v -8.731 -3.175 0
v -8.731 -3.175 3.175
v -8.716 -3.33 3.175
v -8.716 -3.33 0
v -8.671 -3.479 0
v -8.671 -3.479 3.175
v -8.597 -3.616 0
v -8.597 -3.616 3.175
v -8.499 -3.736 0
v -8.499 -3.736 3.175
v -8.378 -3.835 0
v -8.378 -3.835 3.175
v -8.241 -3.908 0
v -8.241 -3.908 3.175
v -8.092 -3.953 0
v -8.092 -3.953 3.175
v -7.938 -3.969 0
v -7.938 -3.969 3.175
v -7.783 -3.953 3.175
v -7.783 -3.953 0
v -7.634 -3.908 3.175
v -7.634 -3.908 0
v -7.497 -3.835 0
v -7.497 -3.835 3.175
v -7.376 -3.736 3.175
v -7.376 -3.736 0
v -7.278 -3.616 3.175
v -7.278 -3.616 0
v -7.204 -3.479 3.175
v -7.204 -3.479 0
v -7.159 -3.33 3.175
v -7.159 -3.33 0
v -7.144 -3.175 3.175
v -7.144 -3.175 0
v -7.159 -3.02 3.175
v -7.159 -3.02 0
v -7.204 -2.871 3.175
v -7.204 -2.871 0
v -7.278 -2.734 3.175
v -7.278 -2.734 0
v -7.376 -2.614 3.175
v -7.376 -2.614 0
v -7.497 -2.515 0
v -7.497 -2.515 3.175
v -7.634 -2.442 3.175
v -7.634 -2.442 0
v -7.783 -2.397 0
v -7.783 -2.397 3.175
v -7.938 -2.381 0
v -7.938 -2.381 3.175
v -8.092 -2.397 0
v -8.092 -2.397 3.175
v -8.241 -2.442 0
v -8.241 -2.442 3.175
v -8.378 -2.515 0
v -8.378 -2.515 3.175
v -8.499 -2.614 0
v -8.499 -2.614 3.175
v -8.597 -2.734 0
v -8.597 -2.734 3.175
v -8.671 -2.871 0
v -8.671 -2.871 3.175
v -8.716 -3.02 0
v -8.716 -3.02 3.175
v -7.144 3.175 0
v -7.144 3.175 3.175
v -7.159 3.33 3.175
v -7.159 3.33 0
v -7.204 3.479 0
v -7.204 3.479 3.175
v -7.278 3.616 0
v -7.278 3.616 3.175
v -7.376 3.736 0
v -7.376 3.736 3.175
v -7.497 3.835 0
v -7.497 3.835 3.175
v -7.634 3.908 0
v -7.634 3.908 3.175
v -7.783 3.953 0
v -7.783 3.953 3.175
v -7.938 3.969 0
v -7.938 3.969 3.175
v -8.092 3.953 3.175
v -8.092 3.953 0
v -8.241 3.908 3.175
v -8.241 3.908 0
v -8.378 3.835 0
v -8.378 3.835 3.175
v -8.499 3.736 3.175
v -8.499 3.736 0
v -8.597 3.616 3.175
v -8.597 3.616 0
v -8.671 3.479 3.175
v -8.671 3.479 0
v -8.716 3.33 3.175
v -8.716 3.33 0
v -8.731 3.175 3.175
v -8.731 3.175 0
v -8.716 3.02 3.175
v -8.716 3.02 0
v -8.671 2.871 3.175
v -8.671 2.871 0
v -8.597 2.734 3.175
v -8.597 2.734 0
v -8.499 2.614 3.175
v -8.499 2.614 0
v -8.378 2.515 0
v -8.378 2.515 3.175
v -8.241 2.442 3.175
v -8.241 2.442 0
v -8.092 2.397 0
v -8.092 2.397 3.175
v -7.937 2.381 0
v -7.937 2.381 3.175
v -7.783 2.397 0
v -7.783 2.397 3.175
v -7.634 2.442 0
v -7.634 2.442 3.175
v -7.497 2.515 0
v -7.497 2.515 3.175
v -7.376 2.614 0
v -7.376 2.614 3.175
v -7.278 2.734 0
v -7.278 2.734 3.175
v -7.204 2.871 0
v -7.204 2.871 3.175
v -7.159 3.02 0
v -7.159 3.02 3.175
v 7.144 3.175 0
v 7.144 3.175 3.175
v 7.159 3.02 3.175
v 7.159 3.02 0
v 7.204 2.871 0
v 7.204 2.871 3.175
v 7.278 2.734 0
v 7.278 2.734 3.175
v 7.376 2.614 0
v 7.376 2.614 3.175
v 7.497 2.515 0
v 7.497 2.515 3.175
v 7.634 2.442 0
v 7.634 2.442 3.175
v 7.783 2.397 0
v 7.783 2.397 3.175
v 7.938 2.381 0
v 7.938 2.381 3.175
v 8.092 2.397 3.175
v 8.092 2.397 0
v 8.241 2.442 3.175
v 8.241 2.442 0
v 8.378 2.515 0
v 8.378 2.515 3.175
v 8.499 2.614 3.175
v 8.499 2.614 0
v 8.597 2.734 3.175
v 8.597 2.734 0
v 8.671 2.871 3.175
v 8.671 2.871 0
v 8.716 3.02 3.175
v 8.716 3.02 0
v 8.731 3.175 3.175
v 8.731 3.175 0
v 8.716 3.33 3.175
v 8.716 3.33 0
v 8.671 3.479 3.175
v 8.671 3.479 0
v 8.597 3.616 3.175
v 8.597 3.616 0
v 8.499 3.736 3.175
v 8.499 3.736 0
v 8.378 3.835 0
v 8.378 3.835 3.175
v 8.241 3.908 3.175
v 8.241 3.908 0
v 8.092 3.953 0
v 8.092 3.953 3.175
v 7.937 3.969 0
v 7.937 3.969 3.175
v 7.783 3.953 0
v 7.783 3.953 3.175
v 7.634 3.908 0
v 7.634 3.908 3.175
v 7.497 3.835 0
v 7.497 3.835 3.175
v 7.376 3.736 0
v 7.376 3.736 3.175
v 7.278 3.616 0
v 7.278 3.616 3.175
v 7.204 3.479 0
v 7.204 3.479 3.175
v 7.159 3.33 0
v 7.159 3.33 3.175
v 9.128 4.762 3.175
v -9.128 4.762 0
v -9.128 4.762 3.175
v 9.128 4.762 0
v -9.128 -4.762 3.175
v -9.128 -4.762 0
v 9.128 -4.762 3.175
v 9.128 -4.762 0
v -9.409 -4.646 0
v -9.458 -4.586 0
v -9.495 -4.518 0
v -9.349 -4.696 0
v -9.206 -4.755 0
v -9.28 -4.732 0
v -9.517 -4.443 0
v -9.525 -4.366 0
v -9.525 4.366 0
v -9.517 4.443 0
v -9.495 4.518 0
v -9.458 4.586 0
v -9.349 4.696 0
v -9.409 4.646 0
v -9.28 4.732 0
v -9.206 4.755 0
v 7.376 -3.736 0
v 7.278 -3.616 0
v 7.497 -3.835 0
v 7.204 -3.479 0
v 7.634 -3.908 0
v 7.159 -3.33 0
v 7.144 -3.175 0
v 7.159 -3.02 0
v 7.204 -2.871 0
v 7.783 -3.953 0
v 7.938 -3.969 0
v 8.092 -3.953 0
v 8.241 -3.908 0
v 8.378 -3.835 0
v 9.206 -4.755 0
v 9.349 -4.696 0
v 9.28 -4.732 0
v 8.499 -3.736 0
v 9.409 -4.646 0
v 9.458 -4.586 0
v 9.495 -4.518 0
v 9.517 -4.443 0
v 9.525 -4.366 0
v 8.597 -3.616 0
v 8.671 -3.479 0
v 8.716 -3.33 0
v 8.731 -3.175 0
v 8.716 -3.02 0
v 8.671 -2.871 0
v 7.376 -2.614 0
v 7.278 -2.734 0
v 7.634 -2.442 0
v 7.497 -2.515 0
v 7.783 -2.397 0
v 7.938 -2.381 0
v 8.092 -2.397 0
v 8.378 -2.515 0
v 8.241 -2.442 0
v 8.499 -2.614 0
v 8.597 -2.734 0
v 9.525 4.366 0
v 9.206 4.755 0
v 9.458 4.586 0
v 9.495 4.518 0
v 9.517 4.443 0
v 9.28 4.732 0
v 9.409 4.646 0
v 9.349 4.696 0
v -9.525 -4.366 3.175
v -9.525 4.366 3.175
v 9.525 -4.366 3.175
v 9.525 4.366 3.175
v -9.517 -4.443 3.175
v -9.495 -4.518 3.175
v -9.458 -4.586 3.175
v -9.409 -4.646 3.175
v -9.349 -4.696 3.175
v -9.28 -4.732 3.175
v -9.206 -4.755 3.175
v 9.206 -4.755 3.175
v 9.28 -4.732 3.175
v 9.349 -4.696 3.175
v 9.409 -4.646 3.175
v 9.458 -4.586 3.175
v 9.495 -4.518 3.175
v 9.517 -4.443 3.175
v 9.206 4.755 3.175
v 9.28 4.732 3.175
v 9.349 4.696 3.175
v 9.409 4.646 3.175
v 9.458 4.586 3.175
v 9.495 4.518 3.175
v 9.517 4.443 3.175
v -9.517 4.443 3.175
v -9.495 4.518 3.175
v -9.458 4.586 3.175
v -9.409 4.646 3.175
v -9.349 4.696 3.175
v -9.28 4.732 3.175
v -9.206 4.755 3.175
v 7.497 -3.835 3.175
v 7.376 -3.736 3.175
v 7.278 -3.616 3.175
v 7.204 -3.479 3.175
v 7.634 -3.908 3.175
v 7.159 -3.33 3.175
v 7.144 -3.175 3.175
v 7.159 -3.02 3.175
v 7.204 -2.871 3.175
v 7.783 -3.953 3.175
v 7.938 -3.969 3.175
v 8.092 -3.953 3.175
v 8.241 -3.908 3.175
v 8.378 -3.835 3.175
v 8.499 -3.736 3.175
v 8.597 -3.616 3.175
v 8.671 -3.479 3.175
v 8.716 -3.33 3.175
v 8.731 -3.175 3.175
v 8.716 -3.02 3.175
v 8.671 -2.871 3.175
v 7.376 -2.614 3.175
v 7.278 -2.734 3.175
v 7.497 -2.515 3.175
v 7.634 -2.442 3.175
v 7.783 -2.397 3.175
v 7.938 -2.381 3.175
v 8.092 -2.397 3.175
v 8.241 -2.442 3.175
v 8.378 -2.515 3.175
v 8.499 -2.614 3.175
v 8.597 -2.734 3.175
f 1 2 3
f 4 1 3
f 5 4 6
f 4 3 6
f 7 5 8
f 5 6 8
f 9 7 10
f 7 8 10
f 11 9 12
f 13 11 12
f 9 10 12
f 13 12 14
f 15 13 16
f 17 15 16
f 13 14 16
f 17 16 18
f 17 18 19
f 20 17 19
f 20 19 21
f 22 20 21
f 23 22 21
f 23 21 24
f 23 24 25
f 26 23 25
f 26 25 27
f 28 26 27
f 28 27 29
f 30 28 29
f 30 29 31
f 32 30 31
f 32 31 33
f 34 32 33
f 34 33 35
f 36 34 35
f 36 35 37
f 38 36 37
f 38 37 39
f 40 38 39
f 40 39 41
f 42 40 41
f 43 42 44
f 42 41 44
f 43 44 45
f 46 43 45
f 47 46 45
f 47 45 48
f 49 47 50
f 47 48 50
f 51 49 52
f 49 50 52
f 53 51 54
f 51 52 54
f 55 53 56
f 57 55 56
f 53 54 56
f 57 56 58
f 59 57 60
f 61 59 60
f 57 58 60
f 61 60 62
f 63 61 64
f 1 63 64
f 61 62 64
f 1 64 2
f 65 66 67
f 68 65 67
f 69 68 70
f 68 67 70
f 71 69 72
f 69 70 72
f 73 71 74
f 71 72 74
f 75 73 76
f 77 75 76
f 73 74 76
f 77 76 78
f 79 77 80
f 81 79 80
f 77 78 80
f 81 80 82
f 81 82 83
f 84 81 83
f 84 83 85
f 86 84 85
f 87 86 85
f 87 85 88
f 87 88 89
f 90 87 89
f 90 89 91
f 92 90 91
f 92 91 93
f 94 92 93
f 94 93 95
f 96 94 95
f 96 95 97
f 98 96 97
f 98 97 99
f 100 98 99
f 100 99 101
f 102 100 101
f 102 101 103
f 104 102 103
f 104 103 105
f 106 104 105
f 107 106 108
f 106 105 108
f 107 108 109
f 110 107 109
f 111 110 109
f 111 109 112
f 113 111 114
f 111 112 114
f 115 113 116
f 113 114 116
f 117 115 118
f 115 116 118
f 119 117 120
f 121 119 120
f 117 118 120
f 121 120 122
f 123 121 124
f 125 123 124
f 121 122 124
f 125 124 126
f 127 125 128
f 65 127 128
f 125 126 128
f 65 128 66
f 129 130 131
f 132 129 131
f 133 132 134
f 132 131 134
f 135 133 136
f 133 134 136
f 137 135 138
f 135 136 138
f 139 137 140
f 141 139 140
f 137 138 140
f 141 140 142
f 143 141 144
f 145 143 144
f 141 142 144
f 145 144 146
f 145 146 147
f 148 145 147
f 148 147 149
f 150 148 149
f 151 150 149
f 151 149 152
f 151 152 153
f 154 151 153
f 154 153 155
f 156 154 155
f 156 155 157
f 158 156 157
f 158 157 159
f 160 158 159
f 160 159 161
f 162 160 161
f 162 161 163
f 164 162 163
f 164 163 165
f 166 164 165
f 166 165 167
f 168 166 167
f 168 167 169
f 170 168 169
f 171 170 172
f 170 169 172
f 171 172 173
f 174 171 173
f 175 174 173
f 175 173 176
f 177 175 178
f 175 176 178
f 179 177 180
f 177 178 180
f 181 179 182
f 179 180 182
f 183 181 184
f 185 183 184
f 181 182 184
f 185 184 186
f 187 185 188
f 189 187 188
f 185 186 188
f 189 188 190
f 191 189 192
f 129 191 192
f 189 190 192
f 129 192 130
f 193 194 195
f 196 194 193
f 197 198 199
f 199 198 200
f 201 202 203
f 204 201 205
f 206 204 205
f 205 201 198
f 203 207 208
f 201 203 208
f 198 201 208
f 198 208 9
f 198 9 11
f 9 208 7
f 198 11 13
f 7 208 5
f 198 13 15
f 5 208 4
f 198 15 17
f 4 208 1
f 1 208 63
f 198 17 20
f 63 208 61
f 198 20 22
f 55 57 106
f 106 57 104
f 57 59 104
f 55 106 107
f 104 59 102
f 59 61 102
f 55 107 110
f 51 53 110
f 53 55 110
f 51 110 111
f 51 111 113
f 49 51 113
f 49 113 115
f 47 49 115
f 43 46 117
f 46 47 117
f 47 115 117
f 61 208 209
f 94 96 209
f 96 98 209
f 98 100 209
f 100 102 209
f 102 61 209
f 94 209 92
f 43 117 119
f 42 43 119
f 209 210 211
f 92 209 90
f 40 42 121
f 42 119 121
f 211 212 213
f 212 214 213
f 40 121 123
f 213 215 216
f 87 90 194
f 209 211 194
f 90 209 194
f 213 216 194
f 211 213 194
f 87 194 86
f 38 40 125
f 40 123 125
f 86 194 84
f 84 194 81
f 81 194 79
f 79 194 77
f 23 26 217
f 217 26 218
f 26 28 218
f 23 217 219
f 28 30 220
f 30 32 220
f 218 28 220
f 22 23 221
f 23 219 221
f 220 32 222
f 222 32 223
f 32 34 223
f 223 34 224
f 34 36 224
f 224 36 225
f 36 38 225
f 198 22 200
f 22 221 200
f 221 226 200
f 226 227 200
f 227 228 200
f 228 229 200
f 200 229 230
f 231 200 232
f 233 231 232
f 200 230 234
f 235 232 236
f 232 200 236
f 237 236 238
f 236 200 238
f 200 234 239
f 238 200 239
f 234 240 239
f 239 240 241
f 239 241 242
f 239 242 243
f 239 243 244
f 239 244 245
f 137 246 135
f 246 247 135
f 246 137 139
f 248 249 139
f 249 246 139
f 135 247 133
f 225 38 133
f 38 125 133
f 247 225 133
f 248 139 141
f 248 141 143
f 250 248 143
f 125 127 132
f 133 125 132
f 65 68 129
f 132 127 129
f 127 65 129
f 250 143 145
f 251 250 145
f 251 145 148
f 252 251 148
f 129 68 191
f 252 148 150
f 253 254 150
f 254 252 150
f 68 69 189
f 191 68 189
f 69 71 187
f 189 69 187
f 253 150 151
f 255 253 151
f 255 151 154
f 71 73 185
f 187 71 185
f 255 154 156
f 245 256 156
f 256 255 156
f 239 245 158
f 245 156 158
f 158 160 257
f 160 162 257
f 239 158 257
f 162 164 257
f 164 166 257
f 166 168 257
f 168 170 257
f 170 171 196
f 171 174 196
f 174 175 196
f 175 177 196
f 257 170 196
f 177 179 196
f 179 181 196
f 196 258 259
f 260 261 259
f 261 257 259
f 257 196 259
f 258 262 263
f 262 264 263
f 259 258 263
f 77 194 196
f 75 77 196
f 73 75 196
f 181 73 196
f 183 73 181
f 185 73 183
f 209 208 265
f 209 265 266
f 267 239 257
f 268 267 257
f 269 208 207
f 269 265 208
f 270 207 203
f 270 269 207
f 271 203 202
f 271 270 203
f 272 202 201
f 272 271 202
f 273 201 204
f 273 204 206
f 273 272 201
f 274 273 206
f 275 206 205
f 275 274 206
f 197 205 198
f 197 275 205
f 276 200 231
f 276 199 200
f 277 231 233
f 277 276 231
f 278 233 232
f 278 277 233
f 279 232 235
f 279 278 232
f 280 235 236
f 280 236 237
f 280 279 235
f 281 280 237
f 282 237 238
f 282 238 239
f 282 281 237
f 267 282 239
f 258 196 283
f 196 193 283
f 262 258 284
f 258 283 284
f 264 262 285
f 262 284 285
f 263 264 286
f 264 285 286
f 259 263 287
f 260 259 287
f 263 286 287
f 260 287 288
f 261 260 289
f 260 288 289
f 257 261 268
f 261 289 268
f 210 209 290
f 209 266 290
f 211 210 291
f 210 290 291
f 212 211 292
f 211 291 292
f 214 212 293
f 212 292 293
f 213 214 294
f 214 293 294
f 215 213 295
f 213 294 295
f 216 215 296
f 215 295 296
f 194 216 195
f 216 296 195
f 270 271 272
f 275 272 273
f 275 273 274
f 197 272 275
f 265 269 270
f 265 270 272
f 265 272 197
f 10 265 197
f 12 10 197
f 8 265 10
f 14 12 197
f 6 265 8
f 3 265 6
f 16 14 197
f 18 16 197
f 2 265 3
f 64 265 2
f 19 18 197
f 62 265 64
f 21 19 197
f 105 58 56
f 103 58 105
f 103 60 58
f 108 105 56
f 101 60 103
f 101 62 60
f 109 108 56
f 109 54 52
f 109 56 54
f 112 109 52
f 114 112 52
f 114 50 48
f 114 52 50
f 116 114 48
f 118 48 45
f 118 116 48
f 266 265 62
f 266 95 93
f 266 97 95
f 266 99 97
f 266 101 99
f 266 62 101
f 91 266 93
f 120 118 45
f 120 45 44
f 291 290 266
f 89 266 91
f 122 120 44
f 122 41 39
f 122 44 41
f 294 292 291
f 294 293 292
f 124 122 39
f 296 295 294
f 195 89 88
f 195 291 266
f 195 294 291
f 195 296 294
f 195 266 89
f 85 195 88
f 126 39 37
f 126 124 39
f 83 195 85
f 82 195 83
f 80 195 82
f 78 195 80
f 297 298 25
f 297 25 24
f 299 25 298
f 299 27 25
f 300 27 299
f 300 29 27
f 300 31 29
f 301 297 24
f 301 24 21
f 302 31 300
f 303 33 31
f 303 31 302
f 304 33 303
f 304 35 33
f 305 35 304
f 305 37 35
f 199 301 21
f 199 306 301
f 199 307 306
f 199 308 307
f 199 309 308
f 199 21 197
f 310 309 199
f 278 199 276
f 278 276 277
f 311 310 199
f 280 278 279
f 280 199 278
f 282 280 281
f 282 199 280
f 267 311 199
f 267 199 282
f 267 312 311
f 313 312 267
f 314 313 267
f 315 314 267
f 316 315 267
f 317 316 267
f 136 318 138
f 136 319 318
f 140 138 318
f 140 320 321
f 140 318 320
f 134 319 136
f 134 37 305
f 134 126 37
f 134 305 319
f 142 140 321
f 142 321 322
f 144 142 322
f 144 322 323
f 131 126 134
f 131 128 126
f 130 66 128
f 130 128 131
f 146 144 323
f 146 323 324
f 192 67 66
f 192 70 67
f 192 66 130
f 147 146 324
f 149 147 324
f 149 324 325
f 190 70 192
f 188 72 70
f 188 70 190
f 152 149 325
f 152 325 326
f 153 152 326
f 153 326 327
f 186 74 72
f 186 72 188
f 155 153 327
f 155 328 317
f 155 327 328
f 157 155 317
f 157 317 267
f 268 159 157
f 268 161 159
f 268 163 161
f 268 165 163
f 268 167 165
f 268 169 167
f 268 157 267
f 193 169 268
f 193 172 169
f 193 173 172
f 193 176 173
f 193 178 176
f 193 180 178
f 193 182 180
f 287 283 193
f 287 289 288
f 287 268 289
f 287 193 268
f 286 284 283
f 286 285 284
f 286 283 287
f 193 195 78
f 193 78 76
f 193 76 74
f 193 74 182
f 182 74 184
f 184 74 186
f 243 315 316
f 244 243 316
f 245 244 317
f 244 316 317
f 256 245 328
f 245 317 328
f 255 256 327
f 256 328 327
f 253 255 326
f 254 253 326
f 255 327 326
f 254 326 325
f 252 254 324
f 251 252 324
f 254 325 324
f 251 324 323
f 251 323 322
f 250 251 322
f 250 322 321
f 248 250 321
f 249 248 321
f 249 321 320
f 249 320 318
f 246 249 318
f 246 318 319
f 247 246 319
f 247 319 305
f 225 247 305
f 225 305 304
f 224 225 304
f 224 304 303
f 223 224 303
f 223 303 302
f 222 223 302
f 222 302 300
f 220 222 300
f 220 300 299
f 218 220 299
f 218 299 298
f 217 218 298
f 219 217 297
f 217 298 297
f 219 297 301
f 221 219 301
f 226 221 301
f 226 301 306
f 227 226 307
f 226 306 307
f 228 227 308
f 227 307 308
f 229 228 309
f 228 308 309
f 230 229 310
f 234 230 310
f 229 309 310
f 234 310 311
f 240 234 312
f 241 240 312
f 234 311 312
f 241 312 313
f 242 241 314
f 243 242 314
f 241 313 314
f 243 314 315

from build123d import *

# Parameters (mm, degrees)
SKETCH2_W           = 19.05
SKETCH2_H           = 9.525
BOSS_EXTRUDE1_DEPTH = 3.175
SKETCH3_R           = 0.79375
CUT_EXTRUDE1_DEPTH  = 12.1125
FILLET1_R           = 0.396875


with BuildPart() as part:
    # Sketch2 → Boss-Extrude1 (new body)
    with BuildSketch(Plane.XY):
        Rectangle(SKETCH2_W, SKETCH2_H)
    extrude(amount=BOSS_EXTRUDE1_DEPTH)

    # Sketch3 → Cut-Extrude1 (cut, through all)
    with BuildSketch(Plane.XY.offset(3.175)):
        with Locations((-7.9375, 3.175)):
            Circle(SKETCH3_R)
        with Locations(Location((-7.9375, -3.175, 0), (0, 0, 180))):
            Circle(SKETCH3_R)
        with Locations((7.9375, -3.175)):
            Circle(SKETCH3_R)
        with Locations(Location((7.9375, 3.175, 0), (0, 0, 180))):
            Circle(SKETCH3_R)
    extrude(amount=-CUT_EXTRUDE1_DEPTH, mode=Mode.SUBTRACT)

    # Fillet1
    fillet1_edges = [part.edges().sort_by_distance(p)[0] for p in [
        (9.525, -4.7625, 1.5875),
        (-9.525, -4.7625, 1.5875),
        (-9.525, 4.7625, 1.5875),
        (9.525, 4.7625, 1.5875),
    ]]
    fillet(fillet1_edges, radius=FILLET1_R)


solid = part.part
